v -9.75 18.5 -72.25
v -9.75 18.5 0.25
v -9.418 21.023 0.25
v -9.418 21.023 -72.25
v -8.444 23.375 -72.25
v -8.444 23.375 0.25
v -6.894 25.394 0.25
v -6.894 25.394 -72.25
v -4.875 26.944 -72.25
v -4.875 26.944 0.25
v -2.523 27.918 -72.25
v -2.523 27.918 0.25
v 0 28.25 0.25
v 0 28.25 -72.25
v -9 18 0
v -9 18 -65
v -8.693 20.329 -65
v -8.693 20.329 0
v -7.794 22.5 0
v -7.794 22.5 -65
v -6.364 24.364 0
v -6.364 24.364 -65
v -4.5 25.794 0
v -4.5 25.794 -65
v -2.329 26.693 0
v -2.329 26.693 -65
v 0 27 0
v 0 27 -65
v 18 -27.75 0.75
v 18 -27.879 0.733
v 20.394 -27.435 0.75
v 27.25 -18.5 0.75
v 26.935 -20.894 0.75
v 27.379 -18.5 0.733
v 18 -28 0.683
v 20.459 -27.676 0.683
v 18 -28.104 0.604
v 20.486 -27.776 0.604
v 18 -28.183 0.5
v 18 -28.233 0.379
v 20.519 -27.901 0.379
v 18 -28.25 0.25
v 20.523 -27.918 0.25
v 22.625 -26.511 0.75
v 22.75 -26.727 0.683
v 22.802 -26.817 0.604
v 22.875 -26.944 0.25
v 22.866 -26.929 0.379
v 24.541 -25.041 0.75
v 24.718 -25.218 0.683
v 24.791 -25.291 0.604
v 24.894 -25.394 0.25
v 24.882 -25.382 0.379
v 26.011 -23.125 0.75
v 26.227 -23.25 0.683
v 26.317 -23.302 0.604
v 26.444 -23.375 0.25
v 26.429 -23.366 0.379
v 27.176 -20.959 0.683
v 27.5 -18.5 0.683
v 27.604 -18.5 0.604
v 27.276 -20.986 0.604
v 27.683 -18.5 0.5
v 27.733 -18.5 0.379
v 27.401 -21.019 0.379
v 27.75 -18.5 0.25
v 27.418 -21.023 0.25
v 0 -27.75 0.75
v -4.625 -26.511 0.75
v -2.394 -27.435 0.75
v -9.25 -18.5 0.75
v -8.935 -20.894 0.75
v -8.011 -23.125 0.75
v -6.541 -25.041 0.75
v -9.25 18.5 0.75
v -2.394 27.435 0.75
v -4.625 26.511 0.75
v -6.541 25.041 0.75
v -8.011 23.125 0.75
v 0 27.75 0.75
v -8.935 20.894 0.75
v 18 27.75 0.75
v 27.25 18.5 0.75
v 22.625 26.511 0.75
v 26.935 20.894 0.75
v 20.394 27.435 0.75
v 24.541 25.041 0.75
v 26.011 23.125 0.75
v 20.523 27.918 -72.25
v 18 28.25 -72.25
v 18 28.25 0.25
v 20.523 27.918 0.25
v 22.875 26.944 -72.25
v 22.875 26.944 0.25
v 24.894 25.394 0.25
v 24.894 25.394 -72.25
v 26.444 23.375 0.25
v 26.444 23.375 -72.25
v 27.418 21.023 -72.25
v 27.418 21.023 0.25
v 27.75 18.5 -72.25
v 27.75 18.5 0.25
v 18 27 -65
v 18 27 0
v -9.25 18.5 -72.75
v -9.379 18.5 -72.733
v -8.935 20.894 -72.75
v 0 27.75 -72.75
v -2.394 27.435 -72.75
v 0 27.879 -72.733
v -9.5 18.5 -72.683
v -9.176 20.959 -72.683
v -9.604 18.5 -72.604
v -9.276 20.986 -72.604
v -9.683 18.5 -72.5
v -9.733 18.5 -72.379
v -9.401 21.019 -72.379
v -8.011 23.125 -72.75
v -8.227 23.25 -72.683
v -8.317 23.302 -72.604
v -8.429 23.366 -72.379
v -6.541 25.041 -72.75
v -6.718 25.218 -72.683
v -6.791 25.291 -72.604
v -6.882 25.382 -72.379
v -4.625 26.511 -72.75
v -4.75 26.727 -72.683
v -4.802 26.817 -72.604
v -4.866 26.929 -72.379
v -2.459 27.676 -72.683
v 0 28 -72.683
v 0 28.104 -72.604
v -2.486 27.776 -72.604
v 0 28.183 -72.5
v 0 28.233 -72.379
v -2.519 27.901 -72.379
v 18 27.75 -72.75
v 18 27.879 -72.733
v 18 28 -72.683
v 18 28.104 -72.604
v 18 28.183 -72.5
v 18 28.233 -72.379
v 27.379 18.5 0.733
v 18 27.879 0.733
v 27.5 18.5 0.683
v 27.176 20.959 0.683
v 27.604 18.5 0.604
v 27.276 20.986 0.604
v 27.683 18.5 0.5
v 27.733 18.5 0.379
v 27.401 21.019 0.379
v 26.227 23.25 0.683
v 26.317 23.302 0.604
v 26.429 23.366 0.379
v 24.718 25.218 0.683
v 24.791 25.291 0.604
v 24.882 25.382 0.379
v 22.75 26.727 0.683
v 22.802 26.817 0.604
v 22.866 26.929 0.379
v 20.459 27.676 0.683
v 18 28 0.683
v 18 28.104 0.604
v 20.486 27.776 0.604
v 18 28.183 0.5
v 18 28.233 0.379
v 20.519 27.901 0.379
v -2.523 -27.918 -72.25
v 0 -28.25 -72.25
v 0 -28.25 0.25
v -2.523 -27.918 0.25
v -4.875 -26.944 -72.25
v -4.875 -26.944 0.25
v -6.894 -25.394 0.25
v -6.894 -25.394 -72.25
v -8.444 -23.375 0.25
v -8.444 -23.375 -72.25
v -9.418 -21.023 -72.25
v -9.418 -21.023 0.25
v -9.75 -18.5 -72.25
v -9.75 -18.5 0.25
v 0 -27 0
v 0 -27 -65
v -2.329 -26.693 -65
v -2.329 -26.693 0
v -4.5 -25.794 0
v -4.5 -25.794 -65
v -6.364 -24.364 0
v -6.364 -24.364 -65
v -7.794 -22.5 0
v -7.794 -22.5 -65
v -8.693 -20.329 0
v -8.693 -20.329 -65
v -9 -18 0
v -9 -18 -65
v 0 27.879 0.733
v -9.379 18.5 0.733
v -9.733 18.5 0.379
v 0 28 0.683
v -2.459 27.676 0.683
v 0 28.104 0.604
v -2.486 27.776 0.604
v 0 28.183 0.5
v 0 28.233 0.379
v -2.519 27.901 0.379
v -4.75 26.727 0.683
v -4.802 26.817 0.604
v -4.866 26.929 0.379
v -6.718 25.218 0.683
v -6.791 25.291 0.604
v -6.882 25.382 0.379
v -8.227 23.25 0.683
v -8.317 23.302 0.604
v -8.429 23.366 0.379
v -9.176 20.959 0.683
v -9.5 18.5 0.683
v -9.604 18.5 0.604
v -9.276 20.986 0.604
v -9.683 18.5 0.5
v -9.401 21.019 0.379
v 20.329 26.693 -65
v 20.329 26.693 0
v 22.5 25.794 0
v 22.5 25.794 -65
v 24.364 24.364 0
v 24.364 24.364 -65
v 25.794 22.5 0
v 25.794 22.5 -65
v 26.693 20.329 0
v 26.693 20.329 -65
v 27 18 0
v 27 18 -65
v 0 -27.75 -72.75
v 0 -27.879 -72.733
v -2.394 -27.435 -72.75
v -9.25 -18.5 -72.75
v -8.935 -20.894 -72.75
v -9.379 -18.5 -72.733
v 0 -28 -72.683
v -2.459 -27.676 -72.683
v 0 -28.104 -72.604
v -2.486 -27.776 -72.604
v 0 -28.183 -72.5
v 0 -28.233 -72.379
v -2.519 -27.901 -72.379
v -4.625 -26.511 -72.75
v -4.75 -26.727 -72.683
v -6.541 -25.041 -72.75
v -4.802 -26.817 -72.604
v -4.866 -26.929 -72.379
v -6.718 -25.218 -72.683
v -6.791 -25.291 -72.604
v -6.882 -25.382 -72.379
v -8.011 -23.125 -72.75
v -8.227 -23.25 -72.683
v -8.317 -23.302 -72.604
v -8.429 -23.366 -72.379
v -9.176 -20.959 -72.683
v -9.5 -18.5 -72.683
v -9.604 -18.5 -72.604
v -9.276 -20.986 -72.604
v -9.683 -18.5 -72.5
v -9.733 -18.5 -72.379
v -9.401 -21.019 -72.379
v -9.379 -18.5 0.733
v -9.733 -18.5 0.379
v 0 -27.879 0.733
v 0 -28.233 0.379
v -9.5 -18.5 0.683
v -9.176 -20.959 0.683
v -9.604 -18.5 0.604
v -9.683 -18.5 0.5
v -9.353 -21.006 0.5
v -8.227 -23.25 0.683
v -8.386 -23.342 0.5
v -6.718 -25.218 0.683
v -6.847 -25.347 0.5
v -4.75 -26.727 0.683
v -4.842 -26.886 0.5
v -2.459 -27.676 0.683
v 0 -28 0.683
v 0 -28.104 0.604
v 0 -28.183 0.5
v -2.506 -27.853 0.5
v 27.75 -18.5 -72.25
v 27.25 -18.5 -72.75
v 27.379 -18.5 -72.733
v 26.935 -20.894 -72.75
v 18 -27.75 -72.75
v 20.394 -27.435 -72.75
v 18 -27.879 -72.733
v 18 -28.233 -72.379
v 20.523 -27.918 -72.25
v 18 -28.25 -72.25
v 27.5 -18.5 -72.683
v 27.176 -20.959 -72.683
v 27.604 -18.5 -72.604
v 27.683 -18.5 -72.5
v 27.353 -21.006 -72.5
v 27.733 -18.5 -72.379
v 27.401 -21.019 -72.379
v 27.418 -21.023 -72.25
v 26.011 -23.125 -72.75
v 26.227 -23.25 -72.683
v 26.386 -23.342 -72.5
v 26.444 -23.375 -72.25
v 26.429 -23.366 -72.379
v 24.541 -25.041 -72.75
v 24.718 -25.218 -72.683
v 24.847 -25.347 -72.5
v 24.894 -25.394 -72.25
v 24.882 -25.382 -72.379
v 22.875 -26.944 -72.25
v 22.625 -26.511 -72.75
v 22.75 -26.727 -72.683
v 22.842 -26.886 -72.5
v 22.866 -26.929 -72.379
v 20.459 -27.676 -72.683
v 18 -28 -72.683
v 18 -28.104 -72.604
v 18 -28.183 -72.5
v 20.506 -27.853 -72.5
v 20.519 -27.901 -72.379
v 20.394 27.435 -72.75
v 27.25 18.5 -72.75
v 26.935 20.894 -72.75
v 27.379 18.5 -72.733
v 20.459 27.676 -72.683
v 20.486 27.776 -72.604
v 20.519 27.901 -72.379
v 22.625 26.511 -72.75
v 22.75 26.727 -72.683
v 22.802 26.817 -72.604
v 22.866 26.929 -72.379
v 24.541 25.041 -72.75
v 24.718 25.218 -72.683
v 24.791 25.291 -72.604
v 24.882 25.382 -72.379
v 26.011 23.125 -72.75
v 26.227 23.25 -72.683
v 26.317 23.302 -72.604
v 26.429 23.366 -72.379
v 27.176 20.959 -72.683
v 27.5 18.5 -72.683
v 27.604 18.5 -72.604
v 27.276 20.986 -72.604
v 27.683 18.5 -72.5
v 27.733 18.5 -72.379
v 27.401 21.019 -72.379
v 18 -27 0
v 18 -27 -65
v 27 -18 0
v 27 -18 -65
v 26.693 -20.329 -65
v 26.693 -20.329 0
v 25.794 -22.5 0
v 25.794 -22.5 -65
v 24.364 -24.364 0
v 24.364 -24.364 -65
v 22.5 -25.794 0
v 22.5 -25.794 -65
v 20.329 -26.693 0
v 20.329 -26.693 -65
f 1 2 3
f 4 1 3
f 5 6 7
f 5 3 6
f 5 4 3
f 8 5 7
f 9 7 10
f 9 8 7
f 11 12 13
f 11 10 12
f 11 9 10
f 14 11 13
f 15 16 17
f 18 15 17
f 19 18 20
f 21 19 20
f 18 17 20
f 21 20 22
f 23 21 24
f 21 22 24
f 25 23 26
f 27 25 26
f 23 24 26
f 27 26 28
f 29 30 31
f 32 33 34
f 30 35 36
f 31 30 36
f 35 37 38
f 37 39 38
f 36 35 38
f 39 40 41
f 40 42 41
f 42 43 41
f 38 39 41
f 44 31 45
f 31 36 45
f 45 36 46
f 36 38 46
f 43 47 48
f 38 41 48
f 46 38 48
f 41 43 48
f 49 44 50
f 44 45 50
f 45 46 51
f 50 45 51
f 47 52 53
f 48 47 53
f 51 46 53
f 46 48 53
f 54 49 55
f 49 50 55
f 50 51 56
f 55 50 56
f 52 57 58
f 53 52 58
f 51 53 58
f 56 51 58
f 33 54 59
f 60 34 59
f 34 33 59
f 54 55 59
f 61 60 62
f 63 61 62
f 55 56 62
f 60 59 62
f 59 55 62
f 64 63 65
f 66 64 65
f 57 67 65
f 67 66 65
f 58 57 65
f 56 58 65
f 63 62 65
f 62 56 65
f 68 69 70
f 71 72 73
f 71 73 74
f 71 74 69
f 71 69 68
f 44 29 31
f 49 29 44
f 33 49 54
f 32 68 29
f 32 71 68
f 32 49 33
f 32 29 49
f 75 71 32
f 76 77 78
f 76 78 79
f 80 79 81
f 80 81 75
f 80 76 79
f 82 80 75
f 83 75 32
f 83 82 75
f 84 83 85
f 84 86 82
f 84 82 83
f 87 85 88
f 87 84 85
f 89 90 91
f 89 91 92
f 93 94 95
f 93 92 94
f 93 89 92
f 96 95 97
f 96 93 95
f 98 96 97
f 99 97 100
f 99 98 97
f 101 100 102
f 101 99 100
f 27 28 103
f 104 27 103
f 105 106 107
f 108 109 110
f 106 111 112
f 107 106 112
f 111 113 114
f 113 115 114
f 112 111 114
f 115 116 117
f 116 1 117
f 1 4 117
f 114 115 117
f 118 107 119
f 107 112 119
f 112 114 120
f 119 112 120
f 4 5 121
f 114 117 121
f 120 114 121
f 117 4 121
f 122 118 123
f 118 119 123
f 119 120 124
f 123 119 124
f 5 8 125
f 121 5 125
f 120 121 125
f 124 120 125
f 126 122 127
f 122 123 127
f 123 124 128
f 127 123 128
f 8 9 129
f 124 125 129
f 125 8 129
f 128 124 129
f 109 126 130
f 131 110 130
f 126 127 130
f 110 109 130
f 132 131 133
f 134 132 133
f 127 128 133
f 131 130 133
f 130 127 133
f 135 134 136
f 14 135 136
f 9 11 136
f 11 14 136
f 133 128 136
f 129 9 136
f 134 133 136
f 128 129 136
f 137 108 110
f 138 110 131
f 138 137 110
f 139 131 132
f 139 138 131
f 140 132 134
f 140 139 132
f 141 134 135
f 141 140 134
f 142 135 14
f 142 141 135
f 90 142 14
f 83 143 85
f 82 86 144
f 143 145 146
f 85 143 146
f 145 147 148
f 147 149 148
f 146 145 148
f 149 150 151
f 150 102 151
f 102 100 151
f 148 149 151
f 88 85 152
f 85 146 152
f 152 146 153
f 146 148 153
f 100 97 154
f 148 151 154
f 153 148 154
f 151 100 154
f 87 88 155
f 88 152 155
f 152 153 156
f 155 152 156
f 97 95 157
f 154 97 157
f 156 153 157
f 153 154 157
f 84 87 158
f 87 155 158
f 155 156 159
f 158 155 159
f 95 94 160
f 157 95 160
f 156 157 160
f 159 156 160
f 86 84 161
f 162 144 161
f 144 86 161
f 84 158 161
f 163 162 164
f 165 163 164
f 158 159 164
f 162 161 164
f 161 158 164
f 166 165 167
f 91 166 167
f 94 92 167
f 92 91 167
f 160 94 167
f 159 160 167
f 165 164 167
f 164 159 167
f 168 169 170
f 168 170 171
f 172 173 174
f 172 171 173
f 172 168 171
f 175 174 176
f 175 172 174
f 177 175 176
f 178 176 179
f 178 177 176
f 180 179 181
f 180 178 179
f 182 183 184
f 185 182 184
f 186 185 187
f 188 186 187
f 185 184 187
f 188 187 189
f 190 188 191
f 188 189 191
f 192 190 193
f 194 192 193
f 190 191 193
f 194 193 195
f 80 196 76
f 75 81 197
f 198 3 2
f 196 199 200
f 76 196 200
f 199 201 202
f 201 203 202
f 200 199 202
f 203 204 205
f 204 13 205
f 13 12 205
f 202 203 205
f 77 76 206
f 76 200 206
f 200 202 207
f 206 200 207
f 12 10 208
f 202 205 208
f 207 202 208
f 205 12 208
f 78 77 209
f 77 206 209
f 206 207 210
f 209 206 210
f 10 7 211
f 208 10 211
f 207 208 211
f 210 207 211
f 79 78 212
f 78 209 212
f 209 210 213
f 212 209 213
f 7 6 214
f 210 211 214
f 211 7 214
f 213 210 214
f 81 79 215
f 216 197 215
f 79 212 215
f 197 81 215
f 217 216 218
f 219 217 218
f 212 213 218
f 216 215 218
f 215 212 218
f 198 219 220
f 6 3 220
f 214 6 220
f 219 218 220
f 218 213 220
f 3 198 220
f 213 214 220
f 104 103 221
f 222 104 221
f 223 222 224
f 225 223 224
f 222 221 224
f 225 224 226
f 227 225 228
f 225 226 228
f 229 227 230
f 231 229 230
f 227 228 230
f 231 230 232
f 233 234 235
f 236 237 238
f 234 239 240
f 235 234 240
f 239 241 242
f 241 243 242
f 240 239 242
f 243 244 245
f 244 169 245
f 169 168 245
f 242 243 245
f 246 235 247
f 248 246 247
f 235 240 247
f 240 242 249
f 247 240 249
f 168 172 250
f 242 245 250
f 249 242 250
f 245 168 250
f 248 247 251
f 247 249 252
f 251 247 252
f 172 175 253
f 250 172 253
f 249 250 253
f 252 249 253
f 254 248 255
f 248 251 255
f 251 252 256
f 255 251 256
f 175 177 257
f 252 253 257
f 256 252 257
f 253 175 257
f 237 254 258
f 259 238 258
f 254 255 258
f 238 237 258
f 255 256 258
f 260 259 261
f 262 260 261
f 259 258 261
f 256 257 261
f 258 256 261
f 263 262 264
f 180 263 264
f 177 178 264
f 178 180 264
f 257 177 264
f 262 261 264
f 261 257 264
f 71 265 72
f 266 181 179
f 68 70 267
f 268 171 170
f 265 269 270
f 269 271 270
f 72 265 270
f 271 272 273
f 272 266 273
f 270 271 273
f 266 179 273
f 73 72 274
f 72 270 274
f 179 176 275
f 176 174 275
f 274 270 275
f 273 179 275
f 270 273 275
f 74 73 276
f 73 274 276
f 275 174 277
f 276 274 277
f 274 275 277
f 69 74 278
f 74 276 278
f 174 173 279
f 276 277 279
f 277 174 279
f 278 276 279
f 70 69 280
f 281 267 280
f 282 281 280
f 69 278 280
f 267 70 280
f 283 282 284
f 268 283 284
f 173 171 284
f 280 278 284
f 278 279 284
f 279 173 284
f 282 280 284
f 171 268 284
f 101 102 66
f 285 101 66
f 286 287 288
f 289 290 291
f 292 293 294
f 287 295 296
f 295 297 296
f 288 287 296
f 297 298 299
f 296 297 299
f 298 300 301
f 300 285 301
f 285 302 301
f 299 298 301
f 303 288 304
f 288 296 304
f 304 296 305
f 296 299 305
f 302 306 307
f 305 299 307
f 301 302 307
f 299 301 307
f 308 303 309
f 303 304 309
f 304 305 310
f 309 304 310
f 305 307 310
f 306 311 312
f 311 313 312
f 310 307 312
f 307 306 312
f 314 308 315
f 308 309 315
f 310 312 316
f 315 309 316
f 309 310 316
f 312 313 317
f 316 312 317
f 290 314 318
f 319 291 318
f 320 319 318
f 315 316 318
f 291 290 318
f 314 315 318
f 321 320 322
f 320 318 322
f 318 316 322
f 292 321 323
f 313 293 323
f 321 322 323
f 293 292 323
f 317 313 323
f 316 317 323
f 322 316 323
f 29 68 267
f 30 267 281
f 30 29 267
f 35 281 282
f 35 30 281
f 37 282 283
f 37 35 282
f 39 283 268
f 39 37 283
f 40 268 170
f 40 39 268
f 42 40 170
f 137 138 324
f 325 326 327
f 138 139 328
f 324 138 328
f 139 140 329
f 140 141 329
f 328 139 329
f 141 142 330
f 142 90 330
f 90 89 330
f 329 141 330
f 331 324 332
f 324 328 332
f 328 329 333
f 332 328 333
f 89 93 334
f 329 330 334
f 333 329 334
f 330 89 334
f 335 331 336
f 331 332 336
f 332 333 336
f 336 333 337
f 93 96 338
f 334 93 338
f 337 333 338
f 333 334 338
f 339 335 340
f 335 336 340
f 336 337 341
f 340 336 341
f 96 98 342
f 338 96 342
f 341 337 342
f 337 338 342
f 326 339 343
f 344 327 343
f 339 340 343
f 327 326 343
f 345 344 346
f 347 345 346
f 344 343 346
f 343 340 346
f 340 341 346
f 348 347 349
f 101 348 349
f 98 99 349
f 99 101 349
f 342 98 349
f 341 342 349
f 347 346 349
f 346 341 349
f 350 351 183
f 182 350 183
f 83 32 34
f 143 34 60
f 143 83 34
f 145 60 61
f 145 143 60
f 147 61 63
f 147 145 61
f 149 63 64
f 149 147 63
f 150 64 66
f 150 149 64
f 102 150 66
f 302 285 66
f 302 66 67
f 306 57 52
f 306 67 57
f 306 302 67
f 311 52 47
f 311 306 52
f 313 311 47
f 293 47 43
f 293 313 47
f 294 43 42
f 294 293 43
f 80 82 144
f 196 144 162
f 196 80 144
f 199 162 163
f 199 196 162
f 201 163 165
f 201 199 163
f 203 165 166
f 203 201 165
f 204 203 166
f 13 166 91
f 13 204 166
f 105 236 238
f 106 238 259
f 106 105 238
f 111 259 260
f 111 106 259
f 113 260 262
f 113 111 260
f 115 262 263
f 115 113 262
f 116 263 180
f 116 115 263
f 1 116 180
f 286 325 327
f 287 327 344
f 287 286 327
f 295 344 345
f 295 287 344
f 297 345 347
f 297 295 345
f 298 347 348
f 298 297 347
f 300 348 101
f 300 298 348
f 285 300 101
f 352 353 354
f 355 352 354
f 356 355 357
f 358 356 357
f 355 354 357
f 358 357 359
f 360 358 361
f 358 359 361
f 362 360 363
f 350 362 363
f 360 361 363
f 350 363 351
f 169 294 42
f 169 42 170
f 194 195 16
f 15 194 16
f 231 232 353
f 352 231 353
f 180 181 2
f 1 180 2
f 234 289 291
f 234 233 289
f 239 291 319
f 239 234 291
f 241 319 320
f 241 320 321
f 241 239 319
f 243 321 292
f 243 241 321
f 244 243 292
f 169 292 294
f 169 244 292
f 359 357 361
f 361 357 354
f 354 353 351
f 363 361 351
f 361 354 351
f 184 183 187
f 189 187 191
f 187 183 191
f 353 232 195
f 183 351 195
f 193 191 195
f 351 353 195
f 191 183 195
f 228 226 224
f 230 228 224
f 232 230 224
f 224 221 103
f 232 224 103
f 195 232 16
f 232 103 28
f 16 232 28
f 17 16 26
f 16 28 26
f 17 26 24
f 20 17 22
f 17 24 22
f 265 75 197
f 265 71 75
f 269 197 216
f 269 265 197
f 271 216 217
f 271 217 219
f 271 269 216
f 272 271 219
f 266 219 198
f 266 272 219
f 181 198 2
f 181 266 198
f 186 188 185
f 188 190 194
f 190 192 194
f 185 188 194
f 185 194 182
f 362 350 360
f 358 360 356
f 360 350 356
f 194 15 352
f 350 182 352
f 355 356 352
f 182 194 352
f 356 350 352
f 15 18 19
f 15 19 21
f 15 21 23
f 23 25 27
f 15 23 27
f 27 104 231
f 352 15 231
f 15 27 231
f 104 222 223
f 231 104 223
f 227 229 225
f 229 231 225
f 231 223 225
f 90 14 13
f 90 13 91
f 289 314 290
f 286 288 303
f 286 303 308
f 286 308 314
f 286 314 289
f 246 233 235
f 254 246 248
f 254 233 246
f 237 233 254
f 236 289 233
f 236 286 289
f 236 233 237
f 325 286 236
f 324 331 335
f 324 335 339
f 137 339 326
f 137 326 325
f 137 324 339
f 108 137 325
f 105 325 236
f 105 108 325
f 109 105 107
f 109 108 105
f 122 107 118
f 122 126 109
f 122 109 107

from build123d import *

# Parameters (mm, degrees)
BOSS_EXTRUDE1_DEPTH = 0.75
BOSS_EXTRUDE2_START = 65
BOSS_EXTRUDE2_DEPTH = 65
BOSS_EXTRUDE3_START = 7.75
BOSS_EXTRUDE3_DEPTH = 7.75
FILLET1_R           = 0.5


with BuildPart() as part:
    # Sketch1 → Boss-Extrude1 (new body)
    with BuildSketch(Plane.XY):
        with BuildLine():
            Line((0, -28.25), (18, -28.25))
            ThreePointArc((18, -28.25), (24.894291117, -25.394291117), (27.75, -18.5))
            Line((27.75, -18.5), (27.75, 18.5))
            ThreePointArc((27.75, 18.5), (24.894291117, 25.394291117), (18, 28.25))
            Line((18, 28.25), (0, 28.25))
            ThreePointArc((0, 28.25), (-6.894291117, 25.394291117), (-9.75, 18.5))
            Line((-9.75, 18.5), (-9.75, -18.5))
            ThreePointArc((-9.75, -18.5), (-6.894291117, -25.394291117), (0, -28.25))
        make_face()
    extrude(amount=BOSS_EXTRUDE1_DEPTH)

    # Sketch2 → Boss-Extrude2 (add)
    with BuildSketch(Plane(origin=(0, 0, 0), x_dir=(-1, 0, 0), z_dir=(0, 0, -1)).offset(BOSS_EXTRUDE2_START)):
        with BuildLine():
            Line((0, 28.25), (-18, 28.25))
            ThreePointArc((-18, 28.25), (-24.894291117, 25.394291117), (-27.75, 18.5))
            Line((-27.75, 18.5), (-27.75, -18.5))
            ThreePointArc((-27.75, -18.5), (-24.894291117, -25.394291117), (-18, -28.25))
            Line((-18, -28.25), (0, -28.25))
            ThreePointArc((0, -28.25), (6.894291117, -25.394291117), (9.75, -18.5))
            Line((9.75, -18.5), (9.75, 18.5))
            ThreePointArc((9.75, 18.5), (6.894291117, 25.394291117), (0, 28.25))
        make_face()
        with BuildLine():
            Line((-27, 18), (-27, -18))
            ThreePointArc((-27, -18), (-24.363961031, -24.363961031), (-18, -27))
            Line((-18, -27), (0, -27))
            ThreePointArc((0, -27), (6.363961031, -24.363961031), (9, -18))
            Line((9, -18), (9, 18))
            ThreePointArc((9, 18), (6.363961031, 24.363961031), (0, 27))
            Line((0, 27), (-18, 27))
            ThreePointArc((-18, 27), (-24.363961031, 24.363961031), (-27, 18))
        make_face(mode=Mode.SUBTRACT)
    extrude(amount=-BOSS_EXTRUDE2_DEPTH)

    # Sketch3 → Boss-Extrude3 (add)
    with BuildSketch(Plane(origin=(0, 0, -65), x_dir=(-1, 0, 0), z_dir=(0, 0, -1)).offset(BOSS_EXTRUDE3_START)):
        with BuildLine():
            Line((9.75, -18.5), (9.75, 18.5))
            ThreePointArc((9.75, 18.5), (6.894291117, 25.394291117), (0, 28.25))
            Line((0, 28.25), (-18, 28.25))
            ThreePointArc((-18, 28.25), (-24.894291117, 25.394291117), (-27.75, 18.5))
            Line((-27.75, 18.5), (-27.75, -18.5))
            ThreePointArc((-27.75, -18.5), (-24.894291117, -25.394291117), (-18, -28.25))
            Line((-18, -28.25), (0, -28.25))
            ThreePointArc((0, -28.25), (6.894291117, -25.394291117), (9.75, -18.5))
        make_face()
    extrude(amount=-BOSS_EXTRUDE3_DEPTH)

    # Fillet1
    fillet1_edges = [part.edges().sort_by_distance(p)[0] for p in [
        (-6.894291117, -25.394291117, 0.75),
        (9, -28.25, 0.75),
        (24.894291117, -25.394291117, 0.75),
        (27.75, 0, 0.75),
        (24.894291117, 25.394291117, 0.75),
        (9, 28.25, 0.75),
        (-6.894291117, 25.394291117, 0.75),
        (9, -28.25, -72.75),
        (-6.894291117, -25.394291117, -72.75),
        (-9.75, 0, -72.75),
        (-6.894291117, 25.394291117, -72.75),
        (9, 28.25, -72.75),
        (24.894291117, 25.394291117, -72.75),
        (27.75, 0, -72.75),
        (24.894291117, -25.394291117, -72.75),
        (-9.75, 0, 0.75),
    ]]
    fillet(fillet1_edges, radius=FILLET1_R)


solid = part.part
